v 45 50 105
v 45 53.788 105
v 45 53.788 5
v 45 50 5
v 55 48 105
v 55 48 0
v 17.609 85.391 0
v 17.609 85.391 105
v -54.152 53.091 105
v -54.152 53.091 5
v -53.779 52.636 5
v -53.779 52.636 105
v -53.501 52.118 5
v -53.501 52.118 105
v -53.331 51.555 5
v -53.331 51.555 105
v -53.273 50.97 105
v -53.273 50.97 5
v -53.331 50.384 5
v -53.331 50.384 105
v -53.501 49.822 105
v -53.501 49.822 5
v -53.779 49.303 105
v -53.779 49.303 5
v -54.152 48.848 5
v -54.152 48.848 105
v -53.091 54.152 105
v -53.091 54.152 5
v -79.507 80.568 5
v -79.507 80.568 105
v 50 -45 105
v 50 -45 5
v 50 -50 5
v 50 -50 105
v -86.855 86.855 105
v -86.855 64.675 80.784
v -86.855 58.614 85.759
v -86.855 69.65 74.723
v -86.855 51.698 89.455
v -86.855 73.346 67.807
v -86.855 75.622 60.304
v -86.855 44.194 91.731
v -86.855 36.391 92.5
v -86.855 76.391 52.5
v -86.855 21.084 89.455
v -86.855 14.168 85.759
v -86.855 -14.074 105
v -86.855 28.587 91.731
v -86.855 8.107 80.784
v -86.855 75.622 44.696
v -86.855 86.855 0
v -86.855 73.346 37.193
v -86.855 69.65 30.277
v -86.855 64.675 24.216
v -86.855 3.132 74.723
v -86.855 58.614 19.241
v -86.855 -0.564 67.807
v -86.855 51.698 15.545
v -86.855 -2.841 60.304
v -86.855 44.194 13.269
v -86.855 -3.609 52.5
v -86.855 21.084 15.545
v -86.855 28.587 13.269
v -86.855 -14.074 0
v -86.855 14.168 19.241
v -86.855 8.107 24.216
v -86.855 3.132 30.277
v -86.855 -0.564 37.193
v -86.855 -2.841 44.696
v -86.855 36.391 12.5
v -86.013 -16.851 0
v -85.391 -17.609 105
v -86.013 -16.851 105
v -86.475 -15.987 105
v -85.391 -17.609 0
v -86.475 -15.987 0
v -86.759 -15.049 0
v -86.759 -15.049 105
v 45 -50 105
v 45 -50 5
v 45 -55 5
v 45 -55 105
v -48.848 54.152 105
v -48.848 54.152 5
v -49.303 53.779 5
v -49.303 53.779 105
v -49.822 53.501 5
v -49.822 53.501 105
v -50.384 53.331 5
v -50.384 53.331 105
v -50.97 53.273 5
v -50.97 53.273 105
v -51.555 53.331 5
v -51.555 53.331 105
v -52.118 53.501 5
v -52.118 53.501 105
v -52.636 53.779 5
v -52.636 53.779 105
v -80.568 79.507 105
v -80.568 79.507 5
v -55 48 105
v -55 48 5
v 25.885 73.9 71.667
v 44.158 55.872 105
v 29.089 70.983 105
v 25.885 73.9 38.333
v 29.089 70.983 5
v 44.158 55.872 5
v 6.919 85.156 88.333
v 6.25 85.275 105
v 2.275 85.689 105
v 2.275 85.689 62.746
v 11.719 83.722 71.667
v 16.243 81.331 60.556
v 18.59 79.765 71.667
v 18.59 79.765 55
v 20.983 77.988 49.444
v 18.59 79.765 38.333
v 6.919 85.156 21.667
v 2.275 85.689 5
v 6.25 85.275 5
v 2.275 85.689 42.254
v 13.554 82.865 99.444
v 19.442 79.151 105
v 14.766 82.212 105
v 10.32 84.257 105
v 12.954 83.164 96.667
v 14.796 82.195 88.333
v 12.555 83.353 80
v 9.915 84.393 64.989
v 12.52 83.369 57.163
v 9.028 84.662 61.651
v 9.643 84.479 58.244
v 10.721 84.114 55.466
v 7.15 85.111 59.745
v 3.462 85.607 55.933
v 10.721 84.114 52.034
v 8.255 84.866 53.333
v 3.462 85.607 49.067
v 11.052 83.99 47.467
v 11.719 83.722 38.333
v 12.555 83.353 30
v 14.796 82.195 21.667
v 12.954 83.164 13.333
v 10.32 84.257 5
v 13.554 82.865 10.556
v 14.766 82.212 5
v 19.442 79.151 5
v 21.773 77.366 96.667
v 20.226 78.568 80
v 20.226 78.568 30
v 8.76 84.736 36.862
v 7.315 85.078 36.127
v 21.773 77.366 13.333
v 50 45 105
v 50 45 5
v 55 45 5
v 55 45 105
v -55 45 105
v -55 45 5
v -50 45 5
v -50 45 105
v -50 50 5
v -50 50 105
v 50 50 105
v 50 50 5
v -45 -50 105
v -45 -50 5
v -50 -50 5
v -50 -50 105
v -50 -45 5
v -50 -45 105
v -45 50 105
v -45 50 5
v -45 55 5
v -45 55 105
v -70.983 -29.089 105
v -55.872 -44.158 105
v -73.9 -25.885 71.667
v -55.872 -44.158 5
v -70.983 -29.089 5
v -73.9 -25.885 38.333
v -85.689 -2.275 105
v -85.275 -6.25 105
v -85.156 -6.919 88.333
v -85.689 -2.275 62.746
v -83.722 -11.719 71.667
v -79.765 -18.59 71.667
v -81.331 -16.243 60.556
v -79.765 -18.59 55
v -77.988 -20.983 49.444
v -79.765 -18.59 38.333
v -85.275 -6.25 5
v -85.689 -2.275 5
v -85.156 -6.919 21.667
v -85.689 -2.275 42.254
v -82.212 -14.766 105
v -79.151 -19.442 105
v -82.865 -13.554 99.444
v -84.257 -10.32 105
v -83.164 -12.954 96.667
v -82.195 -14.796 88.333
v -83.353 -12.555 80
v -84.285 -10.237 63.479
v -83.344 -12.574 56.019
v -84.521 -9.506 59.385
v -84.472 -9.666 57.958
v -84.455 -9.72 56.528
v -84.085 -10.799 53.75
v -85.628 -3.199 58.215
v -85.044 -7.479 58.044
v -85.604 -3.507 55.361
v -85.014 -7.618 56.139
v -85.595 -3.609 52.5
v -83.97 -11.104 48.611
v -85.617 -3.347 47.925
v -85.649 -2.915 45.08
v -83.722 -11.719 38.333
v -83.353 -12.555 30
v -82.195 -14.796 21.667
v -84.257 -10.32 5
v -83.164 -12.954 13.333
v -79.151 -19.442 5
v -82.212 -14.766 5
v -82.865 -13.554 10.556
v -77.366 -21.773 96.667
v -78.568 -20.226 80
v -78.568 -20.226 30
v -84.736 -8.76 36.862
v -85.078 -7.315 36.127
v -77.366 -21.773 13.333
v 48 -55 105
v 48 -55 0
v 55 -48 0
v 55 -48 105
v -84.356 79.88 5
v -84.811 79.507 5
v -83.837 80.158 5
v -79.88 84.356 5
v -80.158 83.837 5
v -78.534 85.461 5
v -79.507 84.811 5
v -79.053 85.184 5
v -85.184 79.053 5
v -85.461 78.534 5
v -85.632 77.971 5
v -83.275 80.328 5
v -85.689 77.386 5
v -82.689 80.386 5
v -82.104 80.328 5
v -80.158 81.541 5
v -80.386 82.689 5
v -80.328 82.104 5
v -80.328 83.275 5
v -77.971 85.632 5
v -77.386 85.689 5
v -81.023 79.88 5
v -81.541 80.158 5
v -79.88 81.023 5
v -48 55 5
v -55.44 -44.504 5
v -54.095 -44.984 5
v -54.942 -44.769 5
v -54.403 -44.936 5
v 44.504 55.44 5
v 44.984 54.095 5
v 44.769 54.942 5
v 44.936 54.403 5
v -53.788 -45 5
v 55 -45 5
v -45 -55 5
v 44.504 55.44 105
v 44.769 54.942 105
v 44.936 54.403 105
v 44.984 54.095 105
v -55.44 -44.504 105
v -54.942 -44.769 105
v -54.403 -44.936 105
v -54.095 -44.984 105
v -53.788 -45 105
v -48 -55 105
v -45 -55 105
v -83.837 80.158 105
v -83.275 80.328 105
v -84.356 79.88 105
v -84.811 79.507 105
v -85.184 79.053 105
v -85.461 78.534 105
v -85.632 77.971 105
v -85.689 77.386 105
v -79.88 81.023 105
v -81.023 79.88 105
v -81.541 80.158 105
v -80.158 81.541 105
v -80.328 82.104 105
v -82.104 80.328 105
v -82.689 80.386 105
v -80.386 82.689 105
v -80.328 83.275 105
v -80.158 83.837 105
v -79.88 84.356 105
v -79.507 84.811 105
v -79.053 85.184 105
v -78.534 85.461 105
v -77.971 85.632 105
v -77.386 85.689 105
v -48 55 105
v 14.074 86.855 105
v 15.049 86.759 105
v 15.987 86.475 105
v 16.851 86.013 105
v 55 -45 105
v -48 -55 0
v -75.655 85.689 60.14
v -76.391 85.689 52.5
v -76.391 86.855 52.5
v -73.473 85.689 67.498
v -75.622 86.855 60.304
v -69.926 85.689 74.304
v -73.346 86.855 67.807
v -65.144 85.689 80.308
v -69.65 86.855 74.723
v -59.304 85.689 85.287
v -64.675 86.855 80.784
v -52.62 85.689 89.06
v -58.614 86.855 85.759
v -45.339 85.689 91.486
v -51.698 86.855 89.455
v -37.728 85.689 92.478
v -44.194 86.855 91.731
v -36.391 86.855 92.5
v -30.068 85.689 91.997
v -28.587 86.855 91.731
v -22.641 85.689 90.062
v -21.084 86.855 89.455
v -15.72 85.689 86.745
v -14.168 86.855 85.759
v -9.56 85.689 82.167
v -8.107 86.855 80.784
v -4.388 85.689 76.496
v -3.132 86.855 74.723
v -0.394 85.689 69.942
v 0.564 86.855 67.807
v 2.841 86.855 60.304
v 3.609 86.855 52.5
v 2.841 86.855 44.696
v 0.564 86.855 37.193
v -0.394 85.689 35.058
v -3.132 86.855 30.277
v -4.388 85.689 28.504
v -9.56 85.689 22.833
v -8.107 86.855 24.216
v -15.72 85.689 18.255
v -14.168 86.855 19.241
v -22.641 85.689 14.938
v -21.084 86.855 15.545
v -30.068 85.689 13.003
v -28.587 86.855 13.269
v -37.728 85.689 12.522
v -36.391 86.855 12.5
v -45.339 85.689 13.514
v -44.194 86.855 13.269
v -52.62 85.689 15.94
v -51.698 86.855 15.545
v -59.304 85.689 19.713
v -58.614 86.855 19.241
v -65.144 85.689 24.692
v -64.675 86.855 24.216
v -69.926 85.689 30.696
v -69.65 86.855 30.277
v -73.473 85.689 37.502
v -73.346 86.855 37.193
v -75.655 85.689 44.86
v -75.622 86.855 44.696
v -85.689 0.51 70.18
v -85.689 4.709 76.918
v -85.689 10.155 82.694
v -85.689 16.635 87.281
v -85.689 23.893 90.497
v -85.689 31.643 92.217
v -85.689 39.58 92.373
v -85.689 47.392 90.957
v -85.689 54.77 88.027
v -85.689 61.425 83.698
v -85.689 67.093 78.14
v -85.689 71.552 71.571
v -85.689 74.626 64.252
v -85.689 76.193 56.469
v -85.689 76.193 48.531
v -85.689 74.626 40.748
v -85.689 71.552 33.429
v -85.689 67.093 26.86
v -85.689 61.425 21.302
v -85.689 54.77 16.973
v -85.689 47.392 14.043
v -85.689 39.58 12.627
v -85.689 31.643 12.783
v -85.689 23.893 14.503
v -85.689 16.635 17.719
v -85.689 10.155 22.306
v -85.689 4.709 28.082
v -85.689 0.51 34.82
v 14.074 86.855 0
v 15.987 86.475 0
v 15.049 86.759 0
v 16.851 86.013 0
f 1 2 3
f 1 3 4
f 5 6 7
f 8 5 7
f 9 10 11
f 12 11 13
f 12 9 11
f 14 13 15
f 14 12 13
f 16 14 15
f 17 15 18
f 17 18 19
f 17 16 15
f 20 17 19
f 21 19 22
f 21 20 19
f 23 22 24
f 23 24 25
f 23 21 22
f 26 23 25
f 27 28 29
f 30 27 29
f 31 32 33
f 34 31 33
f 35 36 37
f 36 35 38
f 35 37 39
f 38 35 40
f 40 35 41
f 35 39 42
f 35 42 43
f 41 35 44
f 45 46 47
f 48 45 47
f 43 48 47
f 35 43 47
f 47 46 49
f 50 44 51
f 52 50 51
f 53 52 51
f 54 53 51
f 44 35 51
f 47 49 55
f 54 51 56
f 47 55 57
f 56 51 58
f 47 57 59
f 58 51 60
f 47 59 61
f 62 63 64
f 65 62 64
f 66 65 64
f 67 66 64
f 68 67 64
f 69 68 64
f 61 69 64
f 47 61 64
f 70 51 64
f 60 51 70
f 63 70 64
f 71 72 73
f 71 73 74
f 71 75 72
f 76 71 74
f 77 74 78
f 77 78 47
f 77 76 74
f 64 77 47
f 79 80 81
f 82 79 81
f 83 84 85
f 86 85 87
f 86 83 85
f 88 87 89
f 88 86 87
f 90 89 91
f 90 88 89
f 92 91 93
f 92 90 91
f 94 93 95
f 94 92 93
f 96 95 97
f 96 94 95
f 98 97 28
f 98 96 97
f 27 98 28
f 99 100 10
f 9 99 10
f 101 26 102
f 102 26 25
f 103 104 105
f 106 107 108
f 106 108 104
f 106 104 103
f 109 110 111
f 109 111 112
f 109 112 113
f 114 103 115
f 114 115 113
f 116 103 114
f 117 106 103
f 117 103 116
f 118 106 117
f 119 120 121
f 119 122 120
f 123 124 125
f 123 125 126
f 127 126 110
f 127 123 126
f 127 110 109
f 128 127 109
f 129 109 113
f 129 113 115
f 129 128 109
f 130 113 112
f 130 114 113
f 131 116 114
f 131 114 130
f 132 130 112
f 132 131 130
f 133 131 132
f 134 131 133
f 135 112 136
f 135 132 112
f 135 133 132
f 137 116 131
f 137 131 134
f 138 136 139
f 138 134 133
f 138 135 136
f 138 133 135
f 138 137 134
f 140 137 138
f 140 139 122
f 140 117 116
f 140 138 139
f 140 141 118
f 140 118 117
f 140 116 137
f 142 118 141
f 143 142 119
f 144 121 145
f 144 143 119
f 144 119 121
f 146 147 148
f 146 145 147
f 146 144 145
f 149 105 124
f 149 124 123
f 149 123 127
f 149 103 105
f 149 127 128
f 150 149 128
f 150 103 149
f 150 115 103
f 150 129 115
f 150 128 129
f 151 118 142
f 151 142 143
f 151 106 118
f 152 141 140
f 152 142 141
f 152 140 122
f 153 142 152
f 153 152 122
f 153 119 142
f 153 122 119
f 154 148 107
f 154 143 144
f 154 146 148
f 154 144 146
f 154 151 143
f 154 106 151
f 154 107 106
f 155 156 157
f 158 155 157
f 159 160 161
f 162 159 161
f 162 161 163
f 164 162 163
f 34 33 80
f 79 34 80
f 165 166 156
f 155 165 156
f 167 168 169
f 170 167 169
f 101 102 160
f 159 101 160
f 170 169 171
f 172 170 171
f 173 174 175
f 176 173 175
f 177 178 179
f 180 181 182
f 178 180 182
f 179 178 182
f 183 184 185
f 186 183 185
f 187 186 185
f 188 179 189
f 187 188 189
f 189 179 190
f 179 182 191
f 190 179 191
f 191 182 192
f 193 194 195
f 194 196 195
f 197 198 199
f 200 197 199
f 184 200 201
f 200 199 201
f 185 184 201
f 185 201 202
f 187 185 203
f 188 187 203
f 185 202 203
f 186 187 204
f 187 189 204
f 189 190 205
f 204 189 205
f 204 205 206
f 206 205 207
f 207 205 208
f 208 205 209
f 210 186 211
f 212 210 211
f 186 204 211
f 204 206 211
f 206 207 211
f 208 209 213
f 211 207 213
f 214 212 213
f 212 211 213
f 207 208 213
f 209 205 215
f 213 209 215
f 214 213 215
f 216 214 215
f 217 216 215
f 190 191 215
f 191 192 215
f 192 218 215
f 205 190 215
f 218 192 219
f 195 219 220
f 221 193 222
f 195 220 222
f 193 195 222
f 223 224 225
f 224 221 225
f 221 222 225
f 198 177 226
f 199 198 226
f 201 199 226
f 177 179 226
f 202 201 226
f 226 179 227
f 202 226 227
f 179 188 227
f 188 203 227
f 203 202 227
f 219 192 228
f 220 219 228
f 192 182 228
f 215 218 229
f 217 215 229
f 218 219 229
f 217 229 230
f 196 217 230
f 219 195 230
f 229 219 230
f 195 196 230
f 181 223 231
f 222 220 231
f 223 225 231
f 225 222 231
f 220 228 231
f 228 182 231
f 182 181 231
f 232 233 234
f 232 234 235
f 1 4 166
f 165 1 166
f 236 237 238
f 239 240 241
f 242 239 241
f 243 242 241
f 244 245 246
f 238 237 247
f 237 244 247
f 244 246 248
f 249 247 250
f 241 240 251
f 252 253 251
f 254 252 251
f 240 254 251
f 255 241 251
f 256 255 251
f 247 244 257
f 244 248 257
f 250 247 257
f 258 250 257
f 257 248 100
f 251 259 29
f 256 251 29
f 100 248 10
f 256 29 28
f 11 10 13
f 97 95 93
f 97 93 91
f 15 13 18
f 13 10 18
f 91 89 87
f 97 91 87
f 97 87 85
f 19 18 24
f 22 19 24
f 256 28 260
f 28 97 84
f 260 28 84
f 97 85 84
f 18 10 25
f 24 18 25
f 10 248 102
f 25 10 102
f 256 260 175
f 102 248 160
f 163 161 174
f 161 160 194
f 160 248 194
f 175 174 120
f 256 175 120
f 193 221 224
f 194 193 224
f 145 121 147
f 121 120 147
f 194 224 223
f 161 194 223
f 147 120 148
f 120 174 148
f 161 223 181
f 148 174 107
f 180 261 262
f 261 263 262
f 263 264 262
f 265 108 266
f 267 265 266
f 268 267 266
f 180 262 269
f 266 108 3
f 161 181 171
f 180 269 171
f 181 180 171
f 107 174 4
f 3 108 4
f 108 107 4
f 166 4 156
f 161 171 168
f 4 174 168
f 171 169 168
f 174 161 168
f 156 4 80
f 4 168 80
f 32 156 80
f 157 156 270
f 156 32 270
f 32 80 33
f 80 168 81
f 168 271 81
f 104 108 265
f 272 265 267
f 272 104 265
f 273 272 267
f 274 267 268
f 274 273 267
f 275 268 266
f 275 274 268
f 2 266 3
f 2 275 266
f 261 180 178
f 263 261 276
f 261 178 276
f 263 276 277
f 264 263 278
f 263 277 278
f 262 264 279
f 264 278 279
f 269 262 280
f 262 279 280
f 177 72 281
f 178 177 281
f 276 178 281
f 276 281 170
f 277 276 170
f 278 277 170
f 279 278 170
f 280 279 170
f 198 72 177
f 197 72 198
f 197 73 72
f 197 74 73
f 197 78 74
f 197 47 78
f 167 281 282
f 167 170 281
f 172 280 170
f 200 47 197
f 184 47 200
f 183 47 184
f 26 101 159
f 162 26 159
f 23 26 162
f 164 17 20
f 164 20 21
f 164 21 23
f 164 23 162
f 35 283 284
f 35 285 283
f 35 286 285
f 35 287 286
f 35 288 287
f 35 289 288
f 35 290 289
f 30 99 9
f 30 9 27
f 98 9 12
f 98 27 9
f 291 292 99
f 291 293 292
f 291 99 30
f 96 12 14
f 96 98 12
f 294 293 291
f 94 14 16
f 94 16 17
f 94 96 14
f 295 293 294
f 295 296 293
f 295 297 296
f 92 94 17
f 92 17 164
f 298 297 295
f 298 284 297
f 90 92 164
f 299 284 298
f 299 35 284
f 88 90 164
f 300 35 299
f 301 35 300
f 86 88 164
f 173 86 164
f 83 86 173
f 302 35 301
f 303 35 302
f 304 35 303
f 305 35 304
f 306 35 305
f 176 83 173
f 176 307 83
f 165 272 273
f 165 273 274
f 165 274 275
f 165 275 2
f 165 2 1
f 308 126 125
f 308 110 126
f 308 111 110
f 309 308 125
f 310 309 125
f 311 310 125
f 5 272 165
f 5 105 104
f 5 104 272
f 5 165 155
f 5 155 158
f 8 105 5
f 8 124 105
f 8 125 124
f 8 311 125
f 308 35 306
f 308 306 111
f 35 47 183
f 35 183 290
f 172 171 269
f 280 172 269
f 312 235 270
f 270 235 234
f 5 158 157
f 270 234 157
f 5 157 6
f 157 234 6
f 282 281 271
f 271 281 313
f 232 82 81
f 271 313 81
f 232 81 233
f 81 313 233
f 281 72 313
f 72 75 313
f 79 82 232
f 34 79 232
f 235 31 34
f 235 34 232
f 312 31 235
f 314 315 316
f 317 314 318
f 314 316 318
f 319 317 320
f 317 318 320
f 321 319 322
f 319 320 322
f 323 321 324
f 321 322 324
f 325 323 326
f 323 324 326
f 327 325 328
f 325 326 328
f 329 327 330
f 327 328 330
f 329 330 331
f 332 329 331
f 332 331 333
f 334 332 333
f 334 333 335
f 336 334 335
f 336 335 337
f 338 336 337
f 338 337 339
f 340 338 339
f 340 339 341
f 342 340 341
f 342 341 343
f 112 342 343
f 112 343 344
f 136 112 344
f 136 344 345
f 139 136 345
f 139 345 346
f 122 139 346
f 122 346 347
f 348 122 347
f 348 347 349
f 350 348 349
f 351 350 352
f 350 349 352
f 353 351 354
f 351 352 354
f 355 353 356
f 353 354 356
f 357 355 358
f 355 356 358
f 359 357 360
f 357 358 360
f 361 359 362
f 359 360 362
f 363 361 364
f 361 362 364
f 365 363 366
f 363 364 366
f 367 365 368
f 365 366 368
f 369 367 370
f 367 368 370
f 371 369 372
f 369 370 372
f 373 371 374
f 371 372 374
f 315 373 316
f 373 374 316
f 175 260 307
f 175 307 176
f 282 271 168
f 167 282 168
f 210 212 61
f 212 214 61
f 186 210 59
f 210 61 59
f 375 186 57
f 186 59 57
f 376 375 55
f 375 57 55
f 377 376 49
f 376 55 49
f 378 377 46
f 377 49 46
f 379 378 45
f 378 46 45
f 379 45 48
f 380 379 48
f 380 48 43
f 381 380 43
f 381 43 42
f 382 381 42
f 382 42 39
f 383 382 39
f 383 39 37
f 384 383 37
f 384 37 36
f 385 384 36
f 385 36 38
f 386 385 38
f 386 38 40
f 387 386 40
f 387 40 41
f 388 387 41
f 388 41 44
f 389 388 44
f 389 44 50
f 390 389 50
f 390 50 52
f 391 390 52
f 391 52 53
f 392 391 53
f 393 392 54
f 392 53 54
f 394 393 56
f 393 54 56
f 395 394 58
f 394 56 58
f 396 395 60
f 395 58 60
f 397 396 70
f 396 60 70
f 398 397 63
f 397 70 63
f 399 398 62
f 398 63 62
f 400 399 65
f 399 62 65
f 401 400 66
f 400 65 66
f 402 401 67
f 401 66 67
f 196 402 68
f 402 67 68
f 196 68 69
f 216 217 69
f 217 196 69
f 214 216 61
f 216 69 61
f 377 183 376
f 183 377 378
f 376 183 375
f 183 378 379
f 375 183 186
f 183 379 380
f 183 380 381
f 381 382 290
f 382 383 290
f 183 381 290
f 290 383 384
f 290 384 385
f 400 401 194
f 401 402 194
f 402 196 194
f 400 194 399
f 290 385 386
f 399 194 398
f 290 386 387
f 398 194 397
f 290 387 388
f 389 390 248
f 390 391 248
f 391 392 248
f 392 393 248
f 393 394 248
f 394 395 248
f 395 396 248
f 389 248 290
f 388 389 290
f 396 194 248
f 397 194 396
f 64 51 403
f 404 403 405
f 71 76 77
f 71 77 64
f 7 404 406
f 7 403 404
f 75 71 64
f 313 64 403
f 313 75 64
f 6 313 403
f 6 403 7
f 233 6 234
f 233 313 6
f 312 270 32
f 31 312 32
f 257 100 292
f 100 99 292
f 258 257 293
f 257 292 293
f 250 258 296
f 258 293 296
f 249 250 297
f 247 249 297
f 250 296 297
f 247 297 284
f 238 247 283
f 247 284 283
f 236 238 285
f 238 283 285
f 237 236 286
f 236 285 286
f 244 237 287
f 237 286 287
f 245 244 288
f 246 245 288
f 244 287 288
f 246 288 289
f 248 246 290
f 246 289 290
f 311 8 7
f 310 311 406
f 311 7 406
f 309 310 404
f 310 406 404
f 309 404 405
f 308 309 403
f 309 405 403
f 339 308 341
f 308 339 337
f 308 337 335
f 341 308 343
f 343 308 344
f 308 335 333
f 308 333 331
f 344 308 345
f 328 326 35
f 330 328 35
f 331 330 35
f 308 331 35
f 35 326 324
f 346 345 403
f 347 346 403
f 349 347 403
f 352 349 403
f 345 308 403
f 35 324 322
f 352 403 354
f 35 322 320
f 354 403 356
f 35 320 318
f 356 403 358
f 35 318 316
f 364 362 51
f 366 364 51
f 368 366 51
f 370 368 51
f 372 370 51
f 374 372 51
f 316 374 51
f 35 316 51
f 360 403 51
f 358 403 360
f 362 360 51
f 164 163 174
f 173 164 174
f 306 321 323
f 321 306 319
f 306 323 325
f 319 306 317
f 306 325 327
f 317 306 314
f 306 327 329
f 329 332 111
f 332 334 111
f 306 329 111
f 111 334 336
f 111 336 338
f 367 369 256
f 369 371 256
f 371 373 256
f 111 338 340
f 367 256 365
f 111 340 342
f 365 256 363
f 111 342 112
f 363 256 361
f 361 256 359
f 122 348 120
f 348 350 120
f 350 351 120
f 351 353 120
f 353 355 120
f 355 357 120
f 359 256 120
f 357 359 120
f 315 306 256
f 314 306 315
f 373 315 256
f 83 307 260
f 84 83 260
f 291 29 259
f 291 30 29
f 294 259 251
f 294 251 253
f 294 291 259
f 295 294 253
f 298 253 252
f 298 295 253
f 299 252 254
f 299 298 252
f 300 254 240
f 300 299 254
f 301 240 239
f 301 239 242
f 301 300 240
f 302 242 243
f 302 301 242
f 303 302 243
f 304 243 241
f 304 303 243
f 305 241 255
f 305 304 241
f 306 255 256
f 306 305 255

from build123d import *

# Parameters (mm, degrees)
F0_W      = 110
F0_H      = 110
F1_DEPTH  = 5
F3_DEPTH  = 100
F4_SIZE   = 7
F6_DEPTH  = 5
F8_DEPTH  = 100
F9_R      = 3
F10_R     = 3
F11_R     = 5
F12_R     = 40
F13_DEPTH = 2
F14_R     = 40
F15_DEPTH = 2


with BuildPart() as f1:
    # F0 (on Top) → F1 (new body)
    with BuildSketch(Plane.XY):
        Rectangle(F0_W, F0_H)
    extrude(amount=F1_DEPTH)

    # F2 (on face) → F3 (join)
    with BuildSketch(Plane.XY.offset(5)):
        Polygon((-55, -45), (-55, -55), (-45, -55), (-45, -50), (-50, -50), (-50, -45), align=None)
        Polygon((45, -50), (45, -55), (55, -55), (55, -45), (50, -45), (50, -50), align=None)
        Polygon((50, 45), (55, 45), (55, 55), (45, 55), (45, 50), (50, 50), align=None)
        Polygon((-55, 45), (-50, 45), (-50, 50), (-45, 50), (-45, 55), (-55, 55), align=None)
    extrude(amount=F3_DEPTH)

    # F4
    f4_edges = [f1.edges().sort_by_distance(p)[0] for p in [
        (55, -55, 52.5),
        (55, 55, 52.5),
        (-55, -55, 52.5),
        (-55, 55, 52.5),
    ]]
    chamfer(f4_edges, length=F4_SIZE)

    # F5 (on face) → F6 (join)
    with BuildSketch(Plane(origin=(0, 0, 0), x_dir=(1, 0, 0), z_dir=(0, 0, -1))):
        Polygon((-55, -48), (-55, 48), (-86.8553390593, 16.1446609407), (-86.8553390593, -86.8553390593), (16.1446609407, -86.8553390593), (48, -55), (-48, -55), align=None)
    extrude(amount=-F6_DEPTH)

    # F7 (on face) → F8 (join)
    with BuildSketch(Plane.XY.offset(5)):
        with BuildLine():
            Line((-86.8553390593, -16.1446609407), (-55, -48))
            Line((-55, -48), (-55, -45))
            add(Edge.make_bspline(
                [(-55, -45), (-61.680716385, -38.545717713), (-73.8128115293, -26.9133031572), (-84.5587400556, -12.5278182858), (-85.5100929907, -5.3594725865), (-85.6892368288, -2.2746161558)],
                knots=[0, 0, 0, 0, 0.4166944434, 0.7503780711, 1, 1, 1, 1], degree=3))
            Line((-85.6892368288, -2.2746161558), (-85.6892368288, 84.628576657))
            Line((-85.6892368288, 84.628576657), (-52.0303300859, 50.9696699141))
            Line((-52.0303300859, 50.9696699141), (-50.9696699141, 52.0303300859))
            Line((-50.9696699141, 52.0303300859), (-84.628576657, 85.6892368288))
            Line((-84.628576657, 85.6892368288), (2.2746161558, 85.6892368288))
            add(Edge.make_bspline(
                [(45, 55), (38.545717713, 61.680716385), (26.9133031572, 73.8128115293), (12.5278182858, 84.5587400556), (5.3594725865, 85.5100929907), (2.2746161558, 85.6892368288)],
                knots=[0, 0, 0, 0, 0.4166944434, 0.7503780711, 1, 1, 1, 1], degree=3))
            Line((45, 55), (48, 55))
            Line((48, 55), (16.1446609407, 86.8553390593))
            Line((16.1446609407, 86.8553390593), (-86.8553390593, 86.8553390593))
            Line((-86.8553390593, 86.8553390593), (-86.8553390593, -16.1446609407))
        make_face()
    extrude(amount=F8_DEPTH)

    # F9
    f9_edges = [f1.edges().sort_by_distance(p)[0] for p in [
        (-50.96967, 52.03033, 55),
        (-52.03033, 50.96967, 55),
    ]]
    fillet(f9_edges, radius=F9_R)

    # F10
    f10_edges = [f1.edges().sort_by_distance(p)[0] for p in [
        (45, 55, 55),
        (-55, -45, 55),
        (-85.689237, 84.628577, 55),
        (-84.628577, 85.689237, 55),
    ]]
    fillet(f10_edges, radius=F10_R)

    # F11
    f11_edges = [f1.edges().sort_by_distance(p)[0] for p in [
        (-86.855339, -16.144661, 52.5),
        (16.144661, 86.855339, 52.5),
    ]]
    fillet(f11_edges, radius=F11_R)

    # F12 (on face) → F13 (cut)
    with BuildSketch(Plane(origin=(0, 86.8553390593, 0), x_dir=(-1, 0, 0), z_dir=(0, 1, 0))):
        with Locations((36.3908729653, 52.5)):
            Circle(F12_R)
    extrude(amount=-F13_DEPTH, mode=Mode.SUBTRACT)

    # F14 (on face) → F15 (cut)
    with BuildSketch(Plane(origin=(-86.8553390593, 0, 0), x_dir=(0, -1, 0), z_dir=(-1, 0, 0))):
        with Locations((-36.3908729653, 52.5)):
            Circle(F14_R)
    extrude(amount=-F15_DEPTH, mode=Mode.SUBTRACT)


solid = f1.part
